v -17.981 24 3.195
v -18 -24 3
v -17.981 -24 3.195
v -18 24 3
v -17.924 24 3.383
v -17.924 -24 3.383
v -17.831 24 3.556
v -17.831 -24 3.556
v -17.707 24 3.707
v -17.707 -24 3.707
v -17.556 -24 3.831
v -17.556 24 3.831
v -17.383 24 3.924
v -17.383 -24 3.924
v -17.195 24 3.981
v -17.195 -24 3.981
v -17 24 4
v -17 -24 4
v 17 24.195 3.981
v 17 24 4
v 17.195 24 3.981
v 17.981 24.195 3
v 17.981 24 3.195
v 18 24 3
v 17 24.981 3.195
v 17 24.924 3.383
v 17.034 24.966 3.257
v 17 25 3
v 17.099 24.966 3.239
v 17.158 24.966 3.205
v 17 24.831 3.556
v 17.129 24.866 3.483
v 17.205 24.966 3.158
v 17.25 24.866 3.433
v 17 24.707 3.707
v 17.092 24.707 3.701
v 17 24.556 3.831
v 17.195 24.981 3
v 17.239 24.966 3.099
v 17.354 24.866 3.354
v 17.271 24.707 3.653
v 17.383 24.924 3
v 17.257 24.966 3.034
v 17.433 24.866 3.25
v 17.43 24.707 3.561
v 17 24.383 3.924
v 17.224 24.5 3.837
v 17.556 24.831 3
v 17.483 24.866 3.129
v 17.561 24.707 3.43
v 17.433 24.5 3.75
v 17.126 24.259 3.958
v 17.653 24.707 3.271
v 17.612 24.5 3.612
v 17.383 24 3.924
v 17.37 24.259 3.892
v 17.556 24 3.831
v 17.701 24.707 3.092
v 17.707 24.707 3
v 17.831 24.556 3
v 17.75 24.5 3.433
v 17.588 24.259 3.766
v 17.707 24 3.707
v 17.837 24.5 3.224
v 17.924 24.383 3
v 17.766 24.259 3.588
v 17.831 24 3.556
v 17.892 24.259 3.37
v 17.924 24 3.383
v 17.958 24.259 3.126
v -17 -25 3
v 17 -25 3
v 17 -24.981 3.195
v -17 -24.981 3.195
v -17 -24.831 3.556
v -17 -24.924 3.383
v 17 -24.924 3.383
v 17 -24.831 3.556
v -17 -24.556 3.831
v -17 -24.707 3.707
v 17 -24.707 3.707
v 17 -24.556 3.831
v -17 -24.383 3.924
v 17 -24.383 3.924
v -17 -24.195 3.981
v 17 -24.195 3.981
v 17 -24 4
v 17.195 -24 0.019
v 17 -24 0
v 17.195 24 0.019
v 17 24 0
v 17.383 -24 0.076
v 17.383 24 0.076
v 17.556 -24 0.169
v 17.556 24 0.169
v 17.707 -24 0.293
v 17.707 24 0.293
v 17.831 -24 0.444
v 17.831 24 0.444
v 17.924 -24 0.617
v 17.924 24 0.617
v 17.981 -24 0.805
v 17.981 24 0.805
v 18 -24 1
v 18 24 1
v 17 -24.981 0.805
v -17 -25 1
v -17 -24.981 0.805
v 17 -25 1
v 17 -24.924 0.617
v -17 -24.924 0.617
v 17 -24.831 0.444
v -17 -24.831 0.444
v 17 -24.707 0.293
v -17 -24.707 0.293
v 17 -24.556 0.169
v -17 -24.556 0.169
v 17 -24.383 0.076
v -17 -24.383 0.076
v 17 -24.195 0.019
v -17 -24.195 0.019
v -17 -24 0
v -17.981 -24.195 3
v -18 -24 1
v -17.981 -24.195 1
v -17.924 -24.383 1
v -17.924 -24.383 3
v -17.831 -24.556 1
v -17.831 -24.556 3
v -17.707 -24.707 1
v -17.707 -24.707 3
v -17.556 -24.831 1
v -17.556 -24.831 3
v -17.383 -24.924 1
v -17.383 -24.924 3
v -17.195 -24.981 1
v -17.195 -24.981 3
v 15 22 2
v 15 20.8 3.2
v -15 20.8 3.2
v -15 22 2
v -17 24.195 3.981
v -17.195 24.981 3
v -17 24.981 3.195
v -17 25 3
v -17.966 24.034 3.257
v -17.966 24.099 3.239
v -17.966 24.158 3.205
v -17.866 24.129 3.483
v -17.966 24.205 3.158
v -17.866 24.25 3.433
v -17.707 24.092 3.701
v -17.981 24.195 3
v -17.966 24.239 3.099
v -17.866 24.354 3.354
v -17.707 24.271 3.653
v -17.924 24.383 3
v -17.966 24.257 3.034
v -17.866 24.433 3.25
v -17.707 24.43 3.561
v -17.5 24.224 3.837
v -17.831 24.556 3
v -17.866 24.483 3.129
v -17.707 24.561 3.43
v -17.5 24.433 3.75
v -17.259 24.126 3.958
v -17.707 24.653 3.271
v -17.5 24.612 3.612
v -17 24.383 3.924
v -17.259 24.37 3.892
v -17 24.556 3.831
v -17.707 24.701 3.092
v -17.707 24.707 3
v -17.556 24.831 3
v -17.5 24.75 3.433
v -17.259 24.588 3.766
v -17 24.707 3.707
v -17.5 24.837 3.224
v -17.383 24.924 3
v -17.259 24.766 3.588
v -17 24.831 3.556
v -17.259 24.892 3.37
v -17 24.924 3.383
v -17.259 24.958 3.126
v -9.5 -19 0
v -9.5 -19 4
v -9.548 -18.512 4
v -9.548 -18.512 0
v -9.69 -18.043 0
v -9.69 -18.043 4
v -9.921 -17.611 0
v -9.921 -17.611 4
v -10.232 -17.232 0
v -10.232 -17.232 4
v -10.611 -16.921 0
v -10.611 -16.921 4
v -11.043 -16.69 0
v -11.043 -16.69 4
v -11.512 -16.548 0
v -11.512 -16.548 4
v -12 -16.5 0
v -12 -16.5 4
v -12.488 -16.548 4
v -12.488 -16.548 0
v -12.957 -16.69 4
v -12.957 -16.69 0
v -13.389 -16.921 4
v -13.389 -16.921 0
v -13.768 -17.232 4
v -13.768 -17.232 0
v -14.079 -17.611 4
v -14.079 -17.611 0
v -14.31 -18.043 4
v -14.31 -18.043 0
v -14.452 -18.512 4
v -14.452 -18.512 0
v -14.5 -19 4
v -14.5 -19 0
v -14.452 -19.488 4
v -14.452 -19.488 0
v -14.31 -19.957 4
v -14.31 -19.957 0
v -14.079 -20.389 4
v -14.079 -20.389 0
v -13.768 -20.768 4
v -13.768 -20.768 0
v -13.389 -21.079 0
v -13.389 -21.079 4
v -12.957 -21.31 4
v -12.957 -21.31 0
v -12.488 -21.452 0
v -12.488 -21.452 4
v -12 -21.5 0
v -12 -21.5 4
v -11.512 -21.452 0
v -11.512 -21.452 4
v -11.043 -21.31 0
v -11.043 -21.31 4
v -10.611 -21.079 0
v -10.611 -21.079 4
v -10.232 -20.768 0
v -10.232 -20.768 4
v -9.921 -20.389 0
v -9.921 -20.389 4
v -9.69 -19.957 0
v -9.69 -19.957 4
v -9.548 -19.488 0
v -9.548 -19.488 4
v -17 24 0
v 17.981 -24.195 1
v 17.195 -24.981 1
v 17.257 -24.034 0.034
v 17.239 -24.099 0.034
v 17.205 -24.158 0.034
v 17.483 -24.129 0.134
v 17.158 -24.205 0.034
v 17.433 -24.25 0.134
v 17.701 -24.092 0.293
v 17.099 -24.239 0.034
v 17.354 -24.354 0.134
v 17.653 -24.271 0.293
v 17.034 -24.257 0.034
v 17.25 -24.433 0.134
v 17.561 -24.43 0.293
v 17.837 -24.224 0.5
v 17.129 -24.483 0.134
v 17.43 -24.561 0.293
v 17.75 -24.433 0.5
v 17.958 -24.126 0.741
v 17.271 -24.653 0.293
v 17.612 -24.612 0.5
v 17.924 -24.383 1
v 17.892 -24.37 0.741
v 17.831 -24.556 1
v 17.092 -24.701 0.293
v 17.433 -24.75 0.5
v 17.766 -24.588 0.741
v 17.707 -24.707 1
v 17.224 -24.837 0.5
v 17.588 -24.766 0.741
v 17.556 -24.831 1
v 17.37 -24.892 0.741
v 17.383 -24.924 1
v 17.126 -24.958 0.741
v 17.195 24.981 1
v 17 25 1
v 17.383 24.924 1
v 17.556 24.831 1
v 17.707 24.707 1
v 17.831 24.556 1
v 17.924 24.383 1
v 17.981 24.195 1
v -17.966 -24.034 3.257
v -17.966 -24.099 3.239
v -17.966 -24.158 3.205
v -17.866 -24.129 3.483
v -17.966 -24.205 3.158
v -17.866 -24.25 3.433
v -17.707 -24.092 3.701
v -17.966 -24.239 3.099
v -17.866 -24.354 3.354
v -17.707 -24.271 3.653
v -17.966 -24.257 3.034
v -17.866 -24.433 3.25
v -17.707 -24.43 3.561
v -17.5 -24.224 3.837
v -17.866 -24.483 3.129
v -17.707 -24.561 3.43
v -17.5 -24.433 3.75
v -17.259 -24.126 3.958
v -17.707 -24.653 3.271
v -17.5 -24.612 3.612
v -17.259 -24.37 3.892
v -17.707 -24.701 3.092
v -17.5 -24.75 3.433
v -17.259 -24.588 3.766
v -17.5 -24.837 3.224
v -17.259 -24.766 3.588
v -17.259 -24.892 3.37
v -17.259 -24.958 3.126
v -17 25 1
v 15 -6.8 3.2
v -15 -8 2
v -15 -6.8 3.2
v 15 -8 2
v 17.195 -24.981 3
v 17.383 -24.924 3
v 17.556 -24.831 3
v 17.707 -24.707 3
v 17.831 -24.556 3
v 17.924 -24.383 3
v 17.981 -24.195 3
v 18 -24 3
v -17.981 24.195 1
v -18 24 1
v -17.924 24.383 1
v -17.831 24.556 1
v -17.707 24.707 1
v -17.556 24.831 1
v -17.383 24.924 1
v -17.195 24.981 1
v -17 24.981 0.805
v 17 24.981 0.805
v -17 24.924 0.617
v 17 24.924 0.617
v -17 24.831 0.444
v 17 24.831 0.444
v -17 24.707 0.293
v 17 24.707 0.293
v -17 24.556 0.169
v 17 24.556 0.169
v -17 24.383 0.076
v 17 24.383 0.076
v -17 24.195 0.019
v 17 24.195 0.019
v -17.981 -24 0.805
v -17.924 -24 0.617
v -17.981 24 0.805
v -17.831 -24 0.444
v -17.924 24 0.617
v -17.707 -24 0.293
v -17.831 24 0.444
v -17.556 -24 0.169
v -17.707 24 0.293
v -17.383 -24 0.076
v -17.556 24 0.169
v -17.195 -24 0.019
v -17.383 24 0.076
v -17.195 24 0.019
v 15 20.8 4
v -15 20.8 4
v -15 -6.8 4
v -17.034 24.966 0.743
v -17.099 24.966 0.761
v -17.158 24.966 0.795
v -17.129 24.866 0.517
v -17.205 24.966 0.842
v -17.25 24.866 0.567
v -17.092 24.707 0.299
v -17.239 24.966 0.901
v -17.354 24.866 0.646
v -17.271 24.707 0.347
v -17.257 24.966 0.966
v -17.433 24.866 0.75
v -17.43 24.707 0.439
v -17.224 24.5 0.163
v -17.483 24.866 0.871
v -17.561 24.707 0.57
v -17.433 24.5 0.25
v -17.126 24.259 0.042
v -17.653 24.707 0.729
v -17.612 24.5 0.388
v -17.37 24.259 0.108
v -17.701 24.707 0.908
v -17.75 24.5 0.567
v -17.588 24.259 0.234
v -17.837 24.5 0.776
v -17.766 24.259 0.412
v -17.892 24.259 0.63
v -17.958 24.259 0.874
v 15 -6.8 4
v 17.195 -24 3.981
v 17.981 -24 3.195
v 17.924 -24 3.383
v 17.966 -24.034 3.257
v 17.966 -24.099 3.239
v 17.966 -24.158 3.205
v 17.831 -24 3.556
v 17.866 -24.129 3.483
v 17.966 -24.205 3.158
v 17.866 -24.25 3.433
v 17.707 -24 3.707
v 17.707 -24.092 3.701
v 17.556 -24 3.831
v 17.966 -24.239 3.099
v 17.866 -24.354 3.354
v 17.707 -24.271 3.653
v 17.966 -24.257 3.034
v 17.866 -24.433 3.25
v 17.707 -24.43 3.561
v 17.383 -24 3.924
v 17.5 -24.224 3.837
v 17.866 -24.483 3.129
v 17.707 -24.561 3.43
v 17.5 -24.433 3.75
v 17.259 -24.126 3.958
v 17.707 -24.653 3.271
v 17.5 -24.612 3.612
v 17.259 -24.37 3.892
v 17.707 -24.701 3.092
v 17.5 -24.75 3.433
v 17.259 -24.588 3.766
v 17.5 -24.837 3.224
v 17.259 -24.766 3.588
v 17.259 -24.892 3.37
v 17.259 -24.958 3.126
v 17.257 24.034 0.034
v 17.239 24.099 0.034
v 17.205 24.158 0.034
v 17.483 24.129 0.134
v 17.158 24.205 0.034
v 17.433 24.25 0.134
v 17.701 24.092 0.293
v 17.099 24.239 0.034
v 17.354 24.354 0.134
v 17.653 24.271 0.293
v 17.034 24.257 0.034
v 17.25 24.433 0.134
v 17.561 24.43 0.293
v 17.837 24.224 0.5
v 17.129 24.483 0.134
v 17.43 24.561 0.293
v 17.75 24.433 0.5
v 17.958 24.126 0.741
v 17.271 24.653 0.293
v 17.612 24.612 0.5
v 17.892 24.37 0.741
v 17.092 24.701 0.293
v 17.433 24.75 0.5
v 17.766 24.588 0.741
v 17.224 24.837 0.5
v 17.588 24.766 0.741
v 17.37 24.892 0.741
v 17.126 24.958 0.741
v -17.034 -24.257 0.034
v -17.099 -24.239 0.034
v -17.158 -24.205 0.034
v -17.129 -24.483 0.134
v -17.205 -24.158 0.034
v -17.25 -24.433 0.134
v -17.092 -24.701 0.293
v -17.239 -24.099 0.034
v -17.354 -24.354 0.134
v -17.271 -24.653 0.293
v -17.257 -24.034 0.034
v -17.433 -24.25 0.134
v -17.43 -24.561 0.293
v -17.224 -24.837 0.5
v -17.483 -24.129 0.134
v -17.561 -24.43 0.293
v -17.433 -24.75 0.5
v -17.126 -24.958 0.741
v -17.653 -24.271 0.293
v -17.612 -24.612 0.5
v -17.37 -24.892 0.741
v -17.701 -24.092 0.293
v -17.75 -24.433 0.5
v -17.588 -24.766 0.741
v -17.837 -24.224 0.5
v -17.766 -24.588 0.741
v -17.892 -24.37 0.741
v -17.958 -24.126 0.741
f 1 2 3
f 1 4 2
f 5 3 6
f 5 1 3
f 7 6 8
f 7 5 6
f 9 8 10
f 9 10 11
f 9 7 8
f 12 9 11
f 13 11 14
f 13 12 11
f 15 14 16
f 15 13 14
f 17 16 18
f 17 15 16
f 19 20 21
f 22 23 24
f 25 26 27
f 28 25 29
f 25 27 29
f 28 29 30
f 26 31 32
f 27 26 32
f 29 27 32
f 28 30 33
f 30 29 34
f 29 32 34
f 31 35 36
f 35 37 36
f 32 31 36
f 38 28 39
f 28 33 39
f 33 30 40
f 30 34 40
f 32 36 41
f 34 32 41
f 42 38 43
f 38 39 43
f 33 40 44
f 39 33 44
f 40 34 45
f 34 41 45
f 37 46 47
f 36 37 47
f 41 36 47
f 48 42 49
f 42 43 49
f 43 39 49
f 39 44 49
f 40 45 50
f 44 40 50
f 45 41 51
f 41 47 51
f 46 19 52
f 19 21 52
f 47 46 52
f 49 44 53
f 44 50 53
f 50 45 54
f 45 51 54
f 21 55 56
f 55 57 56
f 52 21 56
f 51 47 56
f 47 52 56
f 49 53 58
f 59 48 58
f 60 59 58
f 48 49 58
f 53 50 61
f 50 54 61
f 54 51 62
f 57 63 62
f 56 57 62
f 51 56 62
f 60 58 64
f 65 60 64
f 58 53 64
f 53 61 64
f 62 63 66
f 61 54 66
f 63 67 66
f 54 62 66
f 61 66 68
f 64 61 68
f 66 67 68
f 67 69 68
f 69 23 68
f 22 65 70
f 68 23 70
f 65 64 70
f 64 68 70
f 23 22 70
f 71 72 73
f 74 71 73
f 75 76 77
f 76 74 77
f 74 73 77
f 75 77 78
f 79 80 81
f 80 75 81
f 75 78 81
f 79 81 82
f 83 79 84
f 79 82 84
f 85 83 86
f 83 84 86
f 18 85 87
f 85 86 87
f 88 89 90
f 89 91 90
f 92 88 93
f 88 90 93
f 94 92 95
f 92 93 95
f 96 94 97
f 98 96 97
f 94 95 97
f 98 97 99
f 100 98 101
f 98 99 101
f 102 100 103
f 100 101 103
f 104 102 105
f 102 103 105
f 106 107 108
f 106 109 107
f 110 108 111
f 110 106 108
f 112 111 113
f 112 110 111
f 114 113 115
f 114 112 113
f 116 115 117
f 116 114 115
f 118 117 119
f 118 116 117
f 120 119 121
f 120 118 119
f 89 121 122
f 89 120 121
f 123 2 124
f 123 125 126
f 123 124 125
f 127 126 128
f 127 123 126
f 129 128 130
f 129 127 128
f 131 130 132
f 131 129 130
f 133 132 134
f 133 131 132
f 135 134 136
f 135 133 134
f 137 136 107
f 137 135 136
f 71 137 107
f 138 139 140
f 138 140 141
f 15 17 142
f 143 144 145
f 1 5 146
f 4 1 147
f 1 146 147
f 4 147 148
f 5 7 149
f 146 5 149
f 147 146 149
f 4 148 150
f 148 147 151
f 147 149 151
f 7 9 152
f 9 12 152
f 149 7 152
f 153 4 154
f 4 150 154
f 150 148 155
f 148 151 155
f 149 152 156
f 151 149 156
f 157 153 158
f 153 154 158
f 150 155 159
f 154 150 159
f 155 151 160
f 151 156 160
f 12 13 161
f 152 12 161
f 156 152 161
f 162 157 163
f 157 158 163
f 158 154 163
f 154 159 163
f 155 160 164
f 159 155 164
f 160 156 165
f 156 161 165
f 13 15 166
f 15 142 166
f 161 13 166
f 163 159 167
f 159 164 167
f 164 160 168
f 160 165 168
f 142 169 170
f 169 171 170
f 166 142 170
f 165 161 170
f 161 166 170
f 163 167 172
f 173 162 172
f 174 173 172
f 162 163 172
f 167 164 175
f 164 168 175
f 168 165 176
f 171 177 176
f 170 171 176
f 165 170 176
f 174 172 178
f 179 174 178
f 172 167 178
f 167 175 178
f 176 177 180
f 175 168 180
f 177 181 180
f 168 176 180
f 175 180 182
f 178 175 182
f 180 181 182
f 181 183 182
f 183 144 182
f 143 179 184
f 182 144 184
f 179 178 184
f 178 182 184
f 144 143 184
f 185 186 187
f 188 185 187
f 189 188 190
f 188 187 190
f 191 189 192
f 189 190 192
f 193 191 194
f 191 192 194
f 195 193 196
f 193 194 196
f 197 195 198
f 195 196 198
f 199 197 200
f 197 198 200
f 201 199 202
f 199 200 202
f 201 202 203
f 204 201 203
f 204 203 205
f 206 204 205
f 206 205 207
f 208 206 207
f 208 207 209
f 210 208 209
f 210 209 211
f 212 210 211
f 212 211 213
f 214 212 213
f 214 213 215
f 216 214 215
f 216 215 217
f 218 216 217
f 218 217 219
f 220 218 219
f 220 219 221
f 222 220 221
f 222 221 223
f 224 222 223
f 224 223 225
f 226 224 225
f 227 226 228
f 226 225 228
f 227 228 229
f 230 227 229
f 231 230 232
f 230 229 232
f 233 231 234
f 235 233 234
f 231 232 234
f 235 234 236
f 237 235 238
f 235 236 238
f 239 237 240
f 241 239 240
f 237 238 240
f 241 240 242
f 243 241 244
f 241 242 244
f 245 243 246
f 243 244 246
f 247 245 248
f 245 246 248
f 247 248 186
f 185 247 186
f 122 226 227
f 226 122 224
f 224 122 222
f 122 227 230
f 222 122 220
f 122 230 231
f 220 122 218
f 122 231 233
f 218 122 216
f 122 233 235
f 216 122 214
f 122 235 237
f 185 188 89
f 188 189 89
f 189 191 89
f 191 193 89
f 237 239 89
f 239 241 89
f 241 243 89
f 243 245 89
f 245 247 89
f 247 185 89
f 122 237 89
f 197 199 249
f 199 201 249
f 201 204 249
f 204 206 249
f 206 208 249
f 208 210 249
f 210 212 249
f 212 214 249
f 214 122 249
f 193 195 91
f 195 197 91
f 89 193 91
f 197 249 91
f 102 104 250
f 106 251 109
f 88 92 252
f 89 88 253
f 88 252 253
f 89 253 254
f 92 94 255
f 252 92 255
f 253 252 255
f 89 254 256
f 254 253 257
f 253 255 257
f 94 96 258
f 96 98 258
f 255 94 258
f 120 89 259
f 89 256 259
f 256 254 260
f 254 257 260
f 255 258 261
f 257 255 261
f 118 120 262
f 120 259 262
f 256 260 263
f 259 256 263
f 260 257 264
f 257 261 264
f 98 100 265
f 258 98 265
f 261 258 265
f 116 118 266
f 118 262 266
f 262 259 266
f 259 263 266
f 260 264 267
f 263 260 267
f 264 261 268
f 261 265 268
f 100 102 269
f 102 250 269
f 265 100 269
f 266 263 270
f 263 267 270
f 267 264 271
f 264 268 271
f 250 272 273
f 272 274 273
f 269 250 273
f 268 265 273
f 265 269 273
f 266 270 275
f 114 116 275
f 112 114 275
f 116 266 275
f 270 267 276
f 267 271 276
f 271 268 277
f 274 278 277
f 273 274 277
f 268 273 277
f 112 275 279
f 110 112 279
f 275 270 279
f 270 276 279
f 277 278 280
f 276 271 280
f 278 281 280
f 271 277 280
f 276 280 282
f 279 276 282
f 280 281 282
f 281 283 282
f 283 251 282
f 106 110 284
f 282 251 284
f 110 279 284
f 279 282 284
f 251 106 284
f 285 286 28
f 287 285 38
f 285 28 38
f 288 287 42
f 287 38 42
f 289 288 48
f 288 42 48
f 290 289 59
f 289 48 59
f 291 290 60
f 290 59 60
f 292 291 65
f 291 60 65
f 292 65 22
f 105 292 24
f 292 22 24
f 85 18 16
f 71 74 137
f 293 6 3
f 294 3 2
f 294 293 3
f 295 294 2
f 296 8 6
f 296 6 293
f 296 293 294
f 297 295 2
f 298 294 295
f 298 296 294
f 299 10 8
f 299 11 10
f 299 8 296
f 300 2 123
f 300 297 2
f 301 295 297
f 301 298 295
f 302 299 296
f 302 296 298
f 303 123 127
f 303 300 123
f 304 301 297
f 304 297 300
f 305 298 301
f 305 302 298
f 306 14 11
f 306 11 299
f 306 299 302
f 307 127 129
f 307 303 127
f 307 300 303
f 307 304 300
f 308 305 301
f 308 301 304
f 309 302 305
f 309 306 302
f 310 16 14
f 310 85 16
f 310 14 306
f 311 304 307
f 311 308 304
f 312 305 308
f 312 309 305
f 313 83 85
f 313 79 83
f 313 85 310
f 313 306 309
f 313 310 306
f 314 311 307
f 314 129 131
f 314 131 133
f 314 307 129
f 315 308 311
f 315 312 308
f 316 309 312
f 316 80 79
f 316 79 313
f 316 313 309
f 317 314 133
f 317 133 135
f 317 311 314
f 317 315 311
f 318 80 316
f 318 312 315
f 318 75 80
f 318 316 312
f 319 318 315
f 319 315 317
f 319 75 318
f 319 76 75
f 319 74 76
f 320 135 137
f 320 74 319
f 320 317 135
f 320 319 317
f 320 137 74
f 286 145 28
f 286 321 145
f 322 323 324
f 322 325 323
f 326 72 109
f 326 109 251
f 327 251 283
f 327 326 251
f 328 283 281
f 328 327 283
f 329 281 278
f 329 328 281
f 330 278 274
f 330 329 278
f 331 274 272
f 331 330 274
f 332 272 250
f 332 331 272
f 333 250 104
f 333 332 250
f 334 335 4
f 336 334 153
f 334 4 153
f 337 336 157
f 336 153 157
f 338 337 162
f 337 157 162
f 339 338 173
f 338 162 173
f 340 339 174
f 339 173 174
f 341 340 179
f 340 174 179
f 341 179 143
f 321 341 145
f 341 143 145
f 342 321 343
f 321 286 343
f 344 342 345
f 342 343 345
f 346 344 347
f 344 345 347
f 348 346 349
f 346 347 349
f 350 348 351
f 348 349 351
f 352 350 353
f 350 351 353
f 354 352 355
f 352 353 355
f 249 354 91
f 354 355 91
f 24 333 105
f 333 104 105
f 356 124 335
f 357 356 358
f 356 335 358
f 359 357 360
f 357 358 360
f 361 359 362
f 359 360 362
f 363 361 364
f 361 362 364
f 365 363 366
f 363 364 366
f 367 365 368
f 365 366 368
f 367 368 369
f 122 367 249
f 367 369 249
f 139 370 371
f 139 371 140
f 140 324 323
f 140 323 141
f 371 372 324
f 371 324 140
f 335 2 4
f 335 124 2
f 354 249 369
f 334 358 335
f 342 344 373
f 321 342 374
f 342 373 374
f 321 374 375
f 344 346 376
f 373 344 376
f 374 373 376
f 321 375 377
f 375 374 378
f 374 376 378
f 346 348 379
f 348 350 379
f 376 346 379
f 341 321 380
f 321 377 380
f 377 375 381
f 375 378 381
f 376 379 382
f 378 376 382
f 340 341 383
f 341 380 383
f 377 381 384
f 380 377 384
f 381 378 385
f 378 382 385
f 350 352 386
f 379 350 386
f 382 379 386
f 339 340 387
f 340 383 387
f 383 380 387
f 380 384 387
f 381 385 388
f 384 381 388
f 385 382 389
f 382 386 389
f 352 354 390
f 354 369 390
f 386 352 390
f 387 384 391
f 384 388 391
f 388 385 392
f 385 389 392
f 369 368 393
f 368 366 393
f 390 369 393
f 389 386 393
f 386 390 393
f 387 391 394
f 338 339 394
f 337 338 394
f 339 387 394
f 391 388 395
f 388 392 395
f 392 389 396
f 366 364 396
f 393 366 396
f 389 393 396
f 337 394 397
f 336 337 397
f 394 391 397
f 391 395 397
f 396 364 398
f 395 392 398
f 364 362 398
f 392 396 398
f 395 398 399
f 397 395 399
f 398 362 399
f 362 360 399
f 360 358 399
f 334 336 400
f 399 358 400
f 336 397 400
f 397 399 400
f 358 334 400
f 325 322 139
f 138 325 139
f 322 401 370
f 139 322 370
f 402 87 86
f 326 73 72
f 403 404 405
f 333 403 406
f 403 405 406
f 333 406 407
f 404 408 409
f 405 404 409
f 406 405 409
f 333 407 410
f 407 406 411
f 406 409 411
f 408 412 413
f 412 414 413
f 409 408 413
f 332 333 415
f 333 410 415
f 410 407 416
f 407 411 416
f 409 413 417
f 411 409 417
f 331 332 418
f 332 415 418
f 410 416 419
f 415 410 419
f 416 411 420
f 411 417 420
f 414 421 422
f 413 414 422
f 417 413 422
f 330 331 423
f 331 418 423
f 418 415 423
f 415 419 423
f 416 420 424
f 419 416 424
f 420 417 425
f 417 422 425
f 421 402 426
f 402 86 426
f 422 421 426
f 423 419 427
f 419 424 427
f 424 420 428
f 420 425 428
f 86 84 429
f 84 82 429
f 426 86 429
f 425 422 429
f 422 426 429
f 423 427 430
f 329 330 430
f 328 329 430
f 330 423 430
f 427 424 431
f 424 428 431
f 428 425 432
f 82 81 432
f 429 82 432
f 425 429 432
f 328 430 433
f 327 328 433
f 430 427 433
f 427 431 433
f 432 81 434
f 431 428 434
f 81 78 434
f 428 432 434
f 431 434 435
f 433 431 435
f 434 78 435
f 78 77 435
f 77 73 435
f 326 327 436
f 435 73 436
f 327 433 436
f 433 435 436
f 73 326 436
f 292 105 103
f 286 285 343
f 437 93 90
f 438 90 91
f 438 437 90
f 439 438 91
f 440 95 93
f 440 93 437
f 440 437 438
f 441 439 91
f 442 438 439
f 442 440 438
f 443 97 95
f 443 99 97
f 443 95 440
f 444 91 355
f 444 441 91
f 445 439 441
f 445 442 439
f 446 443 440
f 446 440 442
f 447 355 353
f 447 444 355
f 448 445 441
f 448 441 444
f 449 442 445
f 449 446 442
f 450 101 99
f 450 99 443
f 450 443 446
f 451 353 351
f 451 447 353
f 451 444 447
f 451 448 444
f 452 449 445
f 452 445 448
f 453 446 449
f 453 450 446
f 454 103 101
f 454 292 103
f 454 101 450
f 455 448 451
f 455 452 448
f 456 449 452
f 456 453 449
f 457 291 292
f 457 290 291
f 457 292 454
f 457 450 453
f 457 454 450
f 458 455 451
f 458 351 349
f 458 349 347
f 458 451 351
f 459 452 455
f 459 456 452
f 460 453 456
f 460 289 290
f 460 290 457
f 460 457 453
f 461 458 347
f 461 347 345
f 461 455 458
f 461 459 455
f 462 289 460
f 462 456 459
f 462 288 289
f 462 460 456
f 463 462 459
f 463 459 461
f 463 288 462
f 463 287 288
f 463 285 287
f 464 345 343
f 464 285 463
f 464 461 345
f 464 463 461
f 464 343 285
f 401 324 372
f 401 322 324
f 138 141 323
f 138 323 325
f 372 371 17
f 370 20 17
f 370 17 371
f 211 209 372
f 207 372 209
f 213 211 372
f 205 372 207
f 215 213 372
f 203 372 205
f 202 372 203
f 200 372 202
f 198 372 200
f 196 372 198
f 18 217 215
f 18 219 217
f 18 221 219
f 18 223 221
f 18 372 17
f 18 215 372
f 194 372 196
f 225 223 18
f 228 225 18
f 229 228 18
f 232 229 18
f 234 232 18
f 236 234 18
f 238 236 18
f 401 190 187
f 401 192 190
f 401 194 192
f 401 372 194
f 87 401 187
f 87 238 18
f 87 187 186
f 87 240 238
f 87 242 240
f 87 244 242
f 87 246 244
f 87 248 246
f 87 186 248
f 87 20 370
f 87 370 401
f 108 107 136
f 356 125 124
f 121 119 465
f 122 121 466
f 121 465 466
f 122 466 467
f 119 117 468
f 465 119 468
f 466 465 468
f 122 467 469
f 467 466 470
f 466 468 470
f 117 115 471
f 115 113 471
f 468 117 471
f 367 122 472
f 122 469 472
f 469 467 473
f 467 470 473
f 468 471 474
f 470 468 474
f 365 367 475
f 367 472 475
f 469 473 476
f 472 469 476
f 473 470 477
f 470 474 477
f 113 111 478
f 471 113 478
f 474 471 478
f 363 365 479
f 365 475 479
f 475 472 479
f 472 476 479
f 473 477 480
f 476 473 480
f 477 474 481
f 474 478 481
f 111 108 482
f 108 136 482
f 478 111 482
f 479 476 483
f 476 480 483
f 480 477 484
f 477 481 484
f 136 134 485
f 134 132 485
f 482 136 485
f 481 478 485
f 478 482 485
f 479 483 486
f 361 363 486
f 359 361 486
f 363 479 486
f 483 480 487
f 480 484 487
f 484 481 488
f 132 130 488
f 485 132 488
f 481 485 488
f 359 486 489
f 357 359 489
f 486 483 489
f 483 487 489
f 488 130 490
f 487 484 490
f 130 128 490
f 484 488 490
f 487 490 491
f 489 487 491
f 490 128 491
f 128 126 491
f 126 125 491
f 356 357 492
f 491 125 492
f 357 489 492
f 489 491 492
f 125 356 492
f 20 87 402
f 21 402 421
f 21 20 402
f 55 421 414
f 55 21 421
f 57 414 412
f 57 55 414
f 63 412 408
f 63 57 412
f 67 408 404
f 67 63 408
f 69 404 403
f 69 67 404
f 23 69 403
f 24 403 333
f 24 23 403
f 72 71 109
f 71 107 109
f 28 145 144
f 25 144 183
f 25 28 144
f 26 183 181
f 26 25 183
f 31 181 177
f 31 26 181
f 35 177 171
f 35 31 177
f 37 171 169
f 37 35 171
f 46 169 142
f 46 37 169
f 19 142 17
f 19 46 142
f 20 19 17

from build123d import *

# Parameters (mm, degrees)
F0_W          = 36
F0_H          = 50
F1_DEPTH      = 4
F2_W          = 30
F2_H          = 30
F3_DEPTH      = 2
F4_R          = 1
F6_DEPTH      = 15
F6_DEPTH_BACK = 15
F8_DEPTH      = 15
F8_DEPTH_BACK = 15
F9_R          = 2.5
F10_DEPTH     = 4.001


with BuildPart() as f1:
    # F0 (on Top) → F1 (new body)
    with BuildSketch(Plane.XY):
        Rectangle(F0_W, F0_H)
    extrude(amount=F1_DEPTH)

    # F2 (on face) → F3 (cut)
    with BuildSketch(Plane.XY.offset(4)):
        with Locations((0, 7)):
            Rectangle(F2_W, F2_H)
    extrude(amount=-F3_DEPTH, mode=Mode.SUBTRACT)

    # F4
    f4_edges = [f1.edges().sort_by_distance(p)[0] for p in [
        (0, -25, 4),
        (18, 0, 4),
        (0, 25, 4),
        (-18, 0, 4),
        (18, -25, 2),
        (-18, -25, 2),
        (18, 25, 2),
        (18, 0, 0),
        (0, -25, 0),
        (-18, 0, 0),
        (0, 25, 0),
        (-18, 25, 2),
    ]]
    fillet(f4_edges, radius=F4_R)

    # F5 (on Right) → F6 (join, two sides)
    with BuildSketch(Plane.YZ) as f6_sk:
        Polygon((-6.8, 4), (-8, 4), (-8, 2), (-6.8, 3.2), align=None)
    extrude(amount=F6_DEPTH)
    extrude(f6_sk.sketch, amount=-F6_DEPTH_BACK)

    # F7 (on Right) → F8 (join, two sides)
    with BuildSketch(Plane.YZ) as f8_sk:
        Polygon((22, 2), (22, 4), (20.8, 4), (20.8, 3.2), align=None)
    extrude(amount=F8_DEPTH)
    extrude(f8_sk.sketch, amount=-F8_DEPTH_BACK)

    # F9 (on face) → F10 (cut, through all)
    with BuildSketch(Plane.XY.offset(4)):
        with Locations((-12, -19)):
            Circle(F9_R)
    extrude(amount=-F10_DEPTH, mode=Mode.SUBTRACT)


solid = f1.part
